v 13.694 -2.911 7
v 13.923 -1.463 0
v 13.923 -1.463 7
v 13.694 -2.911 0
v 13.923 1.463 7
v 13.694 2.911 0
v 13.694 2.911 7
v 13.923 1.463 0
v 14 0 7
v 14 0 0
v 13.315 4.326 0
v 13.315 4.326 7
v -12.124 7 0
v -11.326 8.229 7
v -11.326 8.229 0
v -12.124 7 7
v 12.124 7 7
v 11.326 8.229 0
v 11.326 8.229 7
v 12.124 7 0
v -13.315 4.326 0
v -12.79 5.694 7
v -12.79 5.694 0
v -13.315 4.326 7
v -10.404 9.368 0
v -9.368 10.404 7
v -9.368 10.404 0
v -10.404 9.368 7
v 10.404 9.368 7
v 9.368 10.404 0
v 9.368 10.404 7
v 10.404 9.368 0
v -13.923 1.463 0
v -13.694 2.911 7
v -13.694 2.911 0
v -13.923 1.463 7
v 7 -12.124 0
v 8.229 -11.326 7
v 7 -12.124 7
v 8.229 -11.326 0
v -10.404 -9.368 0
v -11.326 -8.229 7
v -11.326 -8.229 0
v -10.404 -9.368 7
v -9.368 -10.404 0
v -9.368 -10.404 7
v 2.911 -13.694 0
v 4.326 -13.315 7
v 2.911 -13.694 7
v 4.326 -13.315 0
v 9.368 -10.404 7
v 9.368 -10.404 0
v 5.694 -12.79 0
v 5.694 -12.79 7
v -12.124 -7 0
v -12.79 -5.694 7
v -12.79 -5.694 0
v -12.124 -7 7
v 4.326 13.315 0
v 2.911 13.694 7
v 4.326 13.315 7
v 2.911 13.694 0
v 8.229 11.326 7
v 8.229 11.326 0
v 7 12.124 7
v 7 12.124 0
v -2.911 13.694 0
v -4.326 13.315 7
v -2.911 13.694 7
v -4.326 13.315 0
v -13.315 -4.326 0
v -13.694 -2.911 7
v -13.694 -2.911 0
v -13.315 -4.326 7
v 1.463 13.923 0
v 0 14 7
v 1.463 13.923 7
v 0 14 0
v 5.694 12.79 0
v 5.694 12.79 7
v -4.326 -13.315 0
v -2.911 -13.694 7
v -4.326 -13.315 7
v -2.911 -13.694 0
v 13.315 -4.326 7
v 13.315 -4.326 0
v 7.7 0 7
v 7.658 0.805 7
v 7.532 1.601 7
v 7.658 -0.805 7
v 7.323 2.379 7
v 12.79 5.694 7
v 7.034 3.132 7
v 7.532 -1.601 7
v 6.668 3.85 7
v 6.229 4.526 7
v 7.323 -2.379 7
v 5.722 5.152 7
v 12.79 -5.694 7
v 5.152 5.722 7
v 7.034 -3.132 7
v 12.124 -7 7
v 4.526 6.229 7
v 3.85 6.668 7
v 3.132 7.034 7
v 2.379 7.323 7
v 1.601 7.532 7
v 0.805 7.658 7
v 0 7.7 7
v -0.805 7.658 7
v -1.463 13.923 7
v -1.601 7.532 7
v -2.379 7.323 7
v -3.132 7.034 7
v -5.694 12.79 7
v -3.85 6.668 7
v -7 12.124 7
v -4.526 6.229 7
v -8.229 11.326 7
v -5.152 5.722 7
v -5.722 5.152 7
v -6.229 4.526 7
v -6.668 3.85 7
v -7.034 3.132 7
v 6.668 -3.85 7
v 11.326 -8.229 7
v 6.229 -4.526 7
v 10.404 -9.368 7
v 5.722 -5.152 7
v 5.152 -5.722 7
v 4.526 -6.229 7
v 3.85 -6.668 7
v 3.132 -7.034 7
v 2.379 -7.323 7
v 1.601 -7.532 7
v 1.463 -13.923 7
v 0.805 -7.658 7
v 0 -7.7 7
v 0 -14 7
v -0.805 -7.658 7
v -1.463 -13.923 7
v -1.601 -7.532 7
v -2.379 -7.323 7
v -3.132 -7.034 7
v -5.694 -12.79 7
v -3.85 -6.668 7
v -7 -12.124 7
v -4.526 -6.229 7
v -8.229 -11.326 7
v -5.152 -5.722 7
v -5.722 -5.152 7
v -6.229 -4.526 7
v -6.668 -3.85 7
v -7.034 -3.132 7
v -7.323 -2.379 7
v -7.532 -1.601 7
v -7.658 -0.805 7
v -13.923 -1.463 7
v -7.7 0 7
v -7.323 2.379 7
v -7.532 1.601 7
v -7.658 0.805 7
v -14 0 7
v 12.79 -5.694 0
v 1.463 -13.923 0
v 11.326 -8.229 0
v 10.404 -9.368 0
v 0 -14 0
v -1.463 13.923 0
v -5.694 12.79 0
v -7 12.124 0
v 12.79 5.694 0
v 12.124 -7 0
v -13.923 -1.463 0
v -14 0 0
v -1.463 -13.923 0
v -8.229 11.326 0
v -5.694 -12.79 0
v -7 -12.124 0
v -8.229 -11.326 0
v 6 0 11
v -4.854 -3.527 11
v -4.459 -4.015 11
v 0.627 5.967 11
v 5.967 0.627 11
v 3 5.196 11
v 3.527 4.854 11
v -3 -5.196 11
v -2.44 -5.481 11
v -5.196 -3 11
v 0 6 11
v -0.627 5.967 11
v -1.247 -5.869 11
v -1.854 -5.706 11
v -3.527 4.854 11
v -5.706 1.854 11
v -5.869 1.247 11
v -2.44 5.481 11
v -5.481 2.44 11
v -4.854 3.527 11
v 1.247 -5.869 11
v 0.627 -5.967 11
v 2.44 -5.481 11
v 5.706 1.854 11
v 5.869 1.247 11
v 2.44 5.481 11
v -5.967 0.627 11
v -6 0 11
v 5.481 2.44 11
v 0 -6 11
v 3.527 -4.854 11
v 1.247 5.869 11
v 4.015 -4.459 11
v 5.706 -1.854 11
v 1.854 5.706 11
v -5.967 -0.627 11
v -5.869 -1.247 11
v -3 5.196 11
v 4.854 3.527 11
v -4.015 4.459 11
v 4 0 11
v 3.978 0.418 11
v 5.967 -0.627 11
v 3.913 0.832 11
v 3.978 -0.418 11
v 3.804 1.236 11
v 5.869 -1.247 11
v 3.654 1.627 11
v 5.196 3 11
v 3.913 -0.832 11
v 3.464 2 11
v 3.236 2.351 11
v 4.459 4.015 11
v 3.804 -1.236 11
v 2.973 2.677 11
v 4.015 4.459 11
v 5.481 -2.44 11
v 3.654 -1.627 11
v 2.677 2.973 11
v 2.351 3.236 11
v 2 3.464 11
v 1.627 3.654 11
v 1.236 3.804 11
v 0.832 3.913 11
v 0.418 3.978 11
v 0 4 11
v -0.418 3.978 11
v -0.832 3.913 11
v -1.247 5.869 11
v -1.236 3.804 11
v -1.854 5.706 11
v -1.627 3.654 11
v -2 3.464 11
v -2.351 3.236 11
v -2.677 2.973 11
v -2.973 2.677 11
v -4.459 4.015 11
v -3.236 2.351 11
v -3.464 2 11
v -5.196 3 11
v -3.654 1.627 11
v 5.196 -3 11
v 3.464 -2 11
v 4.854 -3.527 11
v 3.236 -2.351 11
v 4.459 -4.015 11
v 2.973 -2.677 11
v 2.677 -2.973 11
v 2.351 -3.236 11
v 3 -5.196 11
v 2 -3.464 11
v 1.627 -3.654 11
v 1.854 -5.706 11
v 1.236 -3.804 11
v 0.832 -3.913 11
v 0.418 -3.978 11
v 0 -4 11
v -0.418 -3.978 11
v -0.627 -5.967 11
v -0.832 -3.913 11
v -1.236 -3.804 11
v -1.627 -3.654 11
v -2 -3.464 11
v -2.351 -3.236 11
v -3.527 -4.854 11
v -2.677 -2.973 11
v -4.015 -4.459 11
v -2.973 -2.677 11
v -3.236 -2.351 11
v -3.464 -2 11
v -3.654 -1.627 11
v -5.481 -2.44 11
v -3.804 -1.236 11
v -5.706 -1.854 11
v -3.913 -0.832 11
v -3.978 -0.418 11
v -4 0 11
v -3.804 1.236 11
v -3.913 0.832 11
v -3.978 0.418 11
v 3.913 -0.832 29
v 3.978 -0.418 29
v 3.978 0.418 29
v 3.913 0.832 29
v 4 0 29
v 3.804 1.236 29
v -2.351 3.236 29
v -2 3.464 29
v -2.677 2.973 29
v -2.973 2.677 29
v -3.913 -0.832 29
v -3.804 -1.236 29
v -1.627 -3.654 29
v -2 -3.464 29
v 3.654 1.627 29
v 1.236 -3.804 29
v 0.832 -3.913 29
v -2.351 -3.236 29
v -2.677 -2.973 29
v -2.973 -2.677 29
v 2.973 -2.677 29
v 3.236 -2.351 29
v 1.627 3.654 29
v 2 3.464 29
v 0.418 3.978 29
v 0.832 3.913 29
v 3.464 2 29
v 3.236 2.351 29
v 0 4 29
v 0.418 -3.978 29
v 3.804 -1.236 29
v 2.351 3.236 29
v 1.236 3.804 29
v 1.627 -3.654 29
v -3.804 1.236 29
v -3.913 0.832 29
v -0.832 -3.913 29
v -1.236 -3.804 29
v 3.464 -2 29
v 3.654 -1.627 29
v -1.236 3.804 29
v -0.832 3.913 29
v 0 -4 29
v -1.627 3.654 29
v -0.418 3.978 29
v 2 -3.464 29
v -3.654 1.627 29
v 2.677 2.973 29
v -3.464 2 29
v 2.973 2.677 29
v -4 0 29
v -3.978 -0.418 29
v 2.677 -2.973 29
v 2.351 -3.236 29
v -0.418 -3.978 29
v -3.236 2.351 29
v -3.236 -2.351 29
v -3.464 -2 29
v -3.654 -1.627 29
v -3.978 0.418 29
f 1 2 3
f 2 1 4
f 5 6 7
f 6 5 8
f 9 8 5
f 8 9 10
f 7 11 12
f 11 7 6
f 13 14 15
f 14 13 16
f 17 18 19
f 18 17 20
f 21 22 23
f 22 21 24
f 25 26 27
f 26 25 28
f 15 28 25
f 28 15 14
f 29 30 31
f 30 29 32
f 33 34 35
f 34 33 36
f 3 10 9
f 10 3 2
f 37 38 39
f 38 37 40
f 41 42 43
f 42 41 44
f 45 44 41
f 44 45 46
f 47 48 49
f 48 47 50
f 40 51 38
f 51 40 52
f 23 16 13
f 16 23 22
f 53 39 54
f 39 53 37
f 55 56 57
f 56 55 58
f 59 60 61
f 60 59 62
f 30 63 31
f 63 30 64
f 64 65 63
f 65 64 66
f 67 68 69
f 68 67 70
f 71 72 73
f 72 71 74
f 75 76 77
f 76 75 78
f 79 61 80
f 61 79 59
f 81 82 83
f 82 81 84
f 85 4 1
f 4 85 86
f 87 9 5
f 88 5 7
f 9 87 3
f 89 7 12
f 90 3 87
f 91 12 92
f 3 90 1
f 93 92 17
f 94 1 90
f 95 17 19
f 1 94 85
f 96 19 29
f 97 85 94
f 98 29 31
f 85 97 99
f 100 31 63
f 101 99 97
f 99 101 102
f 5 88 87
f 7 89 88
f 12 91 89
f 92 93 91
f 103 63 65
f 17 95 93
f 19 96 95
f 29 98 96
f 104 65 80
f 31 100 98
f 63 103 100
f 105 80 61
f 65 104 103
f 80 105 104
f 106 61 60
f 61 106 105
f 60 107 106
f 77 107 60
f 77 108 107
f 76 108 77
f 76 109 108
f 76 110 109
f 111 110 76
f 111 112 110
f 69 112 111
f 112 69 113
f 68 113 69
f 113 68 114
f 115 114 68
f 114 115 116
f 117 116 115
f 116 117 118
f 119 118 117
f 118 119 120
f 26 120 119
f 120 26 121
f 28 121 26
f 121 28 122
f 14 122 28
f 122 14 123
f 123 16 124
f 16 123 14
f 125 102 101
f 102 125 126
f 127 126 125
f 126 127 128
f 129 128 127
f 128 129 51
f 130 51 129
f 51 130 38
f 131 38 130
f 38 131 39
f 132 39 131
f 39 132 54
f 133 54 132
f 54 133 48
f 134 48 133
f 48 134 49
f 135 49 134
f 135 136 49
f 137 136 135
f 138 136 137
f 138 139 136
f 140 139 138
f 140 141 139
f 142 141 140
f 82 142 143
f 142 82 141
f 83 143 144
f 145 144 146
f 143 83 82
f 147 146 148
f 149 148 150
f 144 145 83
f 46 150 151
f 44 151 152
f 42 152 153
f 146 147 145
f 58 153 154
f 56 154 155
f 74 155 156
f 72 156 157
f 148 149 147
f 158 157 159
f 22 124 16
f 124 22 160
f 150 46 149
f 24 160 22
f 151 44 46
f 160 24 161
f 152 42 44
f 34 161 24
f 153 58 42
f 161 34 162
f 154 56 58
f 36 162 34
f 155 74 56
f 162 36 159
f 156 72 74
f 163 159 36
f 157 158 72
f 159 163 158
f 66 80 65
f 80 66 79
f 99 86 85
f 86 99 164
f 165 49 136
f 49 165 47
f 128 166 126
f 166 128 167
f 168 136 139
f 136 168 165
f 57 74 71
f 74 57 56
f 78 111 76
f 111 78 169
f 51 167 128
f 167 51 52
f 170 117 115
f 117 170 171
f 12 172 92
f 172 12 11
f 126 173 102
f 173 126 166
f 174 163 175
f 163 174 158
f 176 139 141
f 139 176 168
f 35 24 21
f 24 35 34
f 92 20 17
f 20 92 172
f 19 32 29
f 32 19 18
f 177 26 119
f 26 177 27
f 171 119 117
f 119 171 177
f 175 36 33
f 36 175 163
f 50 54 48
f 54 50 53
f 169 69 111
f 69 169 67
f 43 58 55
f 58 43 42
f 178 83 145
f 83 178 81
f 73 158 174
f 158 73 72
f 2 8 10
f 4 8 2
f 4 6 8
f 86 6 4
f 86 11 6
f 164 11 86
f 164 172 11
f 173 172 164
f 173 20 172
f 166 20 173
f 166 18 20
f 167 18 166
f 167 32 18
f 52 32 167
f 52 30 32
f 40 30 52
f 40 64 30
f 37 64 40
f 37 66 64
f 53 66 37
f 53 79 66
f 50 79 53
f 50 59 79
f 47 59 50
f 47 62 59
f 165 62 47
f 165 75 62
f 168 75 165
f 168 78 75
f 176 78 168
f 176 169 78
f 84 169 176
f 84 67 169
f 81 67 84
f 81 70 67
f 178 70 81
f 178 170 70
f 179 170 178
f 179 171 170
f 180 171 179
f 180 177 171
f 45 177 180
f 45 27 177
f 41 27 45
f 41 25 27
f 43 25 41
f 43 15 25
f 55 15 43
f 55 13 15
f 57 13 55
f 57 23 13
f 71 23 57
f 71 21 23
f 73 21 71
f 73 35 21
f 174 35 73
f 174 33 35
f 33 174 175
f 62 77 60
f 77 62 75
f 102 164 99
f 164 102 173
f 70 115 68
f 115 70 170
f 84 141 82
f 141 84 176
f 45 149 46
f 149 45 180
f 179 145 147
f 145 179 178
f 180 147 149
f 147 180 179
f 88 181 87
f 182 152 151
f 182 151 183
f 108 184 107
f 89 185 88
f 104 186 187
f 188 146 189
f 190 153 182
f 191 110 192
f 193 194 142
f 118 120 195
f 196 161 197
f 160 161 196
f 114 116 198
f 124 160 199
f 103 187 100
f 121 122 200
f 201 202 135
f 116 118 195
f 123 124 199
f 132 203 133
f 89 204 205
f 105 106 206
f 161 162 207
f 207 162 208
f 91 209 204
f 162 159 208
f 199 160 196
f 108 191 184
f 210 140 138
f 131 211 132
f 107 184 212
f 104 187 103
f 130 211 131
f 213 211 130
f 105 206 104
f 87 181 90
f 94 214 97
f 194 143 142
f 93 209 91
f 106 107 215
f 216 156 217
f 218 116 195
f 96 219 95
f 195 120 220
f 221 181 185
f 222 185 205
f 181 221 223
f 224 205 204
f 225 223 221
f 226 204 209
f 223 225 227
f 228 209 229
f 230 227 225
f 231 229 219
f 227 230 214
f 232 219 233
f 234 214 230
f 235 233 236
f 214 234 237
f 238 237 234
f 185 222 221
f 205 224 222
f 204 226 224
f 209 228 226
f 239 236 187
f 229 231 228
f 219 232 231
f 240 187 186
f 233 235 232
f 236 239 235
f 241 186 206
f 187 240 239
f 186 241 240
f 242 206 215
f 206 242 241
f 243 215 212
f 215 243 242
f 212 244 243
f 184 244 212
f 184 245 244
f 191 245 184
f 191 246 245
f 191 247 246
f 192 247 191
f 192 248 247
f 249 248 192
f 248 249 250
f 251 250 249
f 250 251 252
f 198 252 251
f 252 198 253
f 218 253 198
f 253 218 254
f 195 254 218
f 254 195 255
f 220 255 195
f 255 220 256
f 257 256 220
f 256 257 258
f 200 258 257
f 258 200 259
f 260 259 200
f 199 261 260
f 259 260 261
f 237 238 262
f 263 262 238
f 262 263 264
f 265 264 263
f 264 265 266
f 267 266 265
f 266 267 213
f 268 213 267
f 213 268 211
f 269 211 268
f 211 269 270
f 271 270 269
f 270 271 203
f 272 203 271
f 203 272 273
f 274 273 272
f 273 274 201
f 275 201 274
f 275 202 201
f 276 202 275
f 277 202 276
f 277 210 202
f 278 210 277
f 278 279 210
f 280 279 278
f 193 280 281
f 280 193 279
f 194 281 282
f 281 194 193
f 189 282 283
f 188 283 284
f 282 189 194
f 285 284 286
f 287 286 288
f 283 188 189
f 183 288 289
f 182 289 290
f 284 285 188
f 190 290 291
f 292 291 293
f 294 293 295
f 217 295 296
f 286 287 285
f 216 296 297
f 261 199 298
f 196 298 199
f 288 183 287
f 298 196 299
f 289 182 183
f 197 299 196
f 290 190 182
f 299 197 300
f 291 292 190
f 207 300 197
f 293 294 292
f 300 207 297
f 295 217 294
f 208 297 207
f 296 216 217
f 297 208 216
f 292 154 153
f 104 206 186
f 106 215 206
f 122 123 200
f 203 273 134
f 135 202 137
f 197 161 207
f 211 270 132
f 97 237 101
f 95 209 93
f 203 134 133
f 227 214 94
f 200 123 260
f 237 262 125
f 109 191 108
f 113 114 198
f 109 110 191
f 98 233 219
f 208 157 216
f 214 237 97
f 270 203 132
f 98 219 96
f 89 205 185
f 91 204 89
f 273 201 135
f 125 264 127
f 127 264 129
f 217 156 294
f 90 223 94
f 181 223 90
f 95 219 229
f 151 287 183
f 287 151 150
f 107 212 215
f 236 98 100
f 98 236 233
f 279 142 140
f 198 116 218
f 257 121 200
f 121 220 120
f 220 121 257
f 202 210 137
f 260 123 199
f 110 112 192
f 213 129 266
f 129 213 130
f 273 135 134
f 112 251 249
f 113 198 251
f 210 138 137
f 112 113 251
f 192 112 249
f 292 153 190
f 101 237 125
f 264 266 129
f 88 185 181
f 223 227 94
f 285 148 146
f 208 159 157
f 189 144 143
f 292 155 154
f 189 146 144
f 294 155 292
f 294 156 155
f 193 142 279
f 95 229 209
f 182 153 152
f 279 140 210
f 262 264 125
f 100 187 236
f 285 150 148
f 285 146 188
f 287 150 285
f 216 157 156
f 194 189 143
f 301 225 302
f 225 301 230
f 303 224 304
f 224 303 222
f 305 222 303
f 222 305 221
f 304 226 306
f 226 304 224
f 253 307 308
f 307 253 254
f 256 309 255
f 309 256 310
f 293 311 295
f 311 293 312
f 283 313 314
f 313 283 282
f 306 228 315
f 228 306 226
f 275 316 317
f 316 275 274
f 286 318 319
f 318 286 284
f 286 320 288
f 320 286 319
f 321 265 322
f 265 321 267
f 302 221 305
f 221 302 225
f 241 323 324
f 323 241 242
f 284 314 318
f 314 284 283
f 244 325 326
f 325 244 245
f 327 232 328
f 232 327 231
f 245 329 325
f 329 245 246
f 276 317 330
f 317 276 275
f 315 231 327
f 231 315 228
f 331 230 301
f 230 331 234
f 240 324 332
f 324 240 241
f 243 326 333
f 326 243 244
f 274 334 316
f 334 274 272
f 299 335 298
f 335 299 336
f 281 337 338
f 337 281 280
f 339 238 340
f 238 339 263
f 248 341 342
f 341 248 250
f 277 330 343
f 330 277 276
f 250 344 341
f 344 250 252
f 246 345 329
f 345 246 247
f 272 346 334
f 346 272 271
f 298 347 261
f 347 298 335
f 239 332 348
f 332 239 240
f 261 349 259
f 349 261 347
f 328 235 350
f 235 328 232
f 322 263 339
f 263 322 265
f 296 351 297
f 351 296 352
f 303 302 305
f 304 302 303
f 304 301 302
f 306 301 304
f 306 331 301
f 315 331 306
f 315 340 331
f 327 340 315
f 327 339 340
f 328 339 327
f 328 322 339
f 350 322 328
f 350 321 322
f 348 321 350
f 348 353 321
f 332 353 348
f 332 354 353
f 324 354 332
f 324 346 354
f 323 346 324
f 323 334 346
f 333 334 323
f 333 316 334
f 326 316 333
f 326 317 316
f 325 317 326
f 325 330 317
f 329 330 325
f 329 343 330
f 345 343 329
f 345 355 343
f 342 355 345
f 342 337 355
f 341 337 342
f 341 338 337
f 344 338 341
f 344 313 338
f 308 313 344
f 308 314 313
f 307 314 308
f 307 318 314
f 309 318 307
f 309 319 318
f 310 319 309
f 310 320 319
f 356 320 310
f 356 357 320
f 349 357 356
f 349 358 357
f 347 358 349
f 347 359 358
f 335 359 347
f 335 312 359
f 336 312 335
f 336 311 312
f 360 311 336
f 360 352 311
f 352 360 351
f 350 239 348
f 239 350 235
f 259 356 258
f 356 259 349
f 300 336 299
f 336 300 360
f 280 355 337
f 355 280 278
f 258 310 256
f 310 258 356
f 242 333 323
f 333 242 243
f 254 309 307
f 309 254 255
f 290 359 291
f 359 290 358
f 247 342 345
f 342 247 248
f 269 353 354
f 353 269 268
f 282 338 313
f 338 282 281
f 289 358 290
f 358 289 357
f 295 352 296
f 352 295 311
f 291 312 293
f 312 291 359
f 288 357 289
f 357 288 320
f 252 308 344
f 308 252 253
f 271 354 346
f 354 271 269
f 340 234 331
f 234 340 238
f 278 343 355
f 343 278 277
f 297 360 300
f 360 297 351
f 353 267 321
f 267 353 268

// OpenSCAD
// Adjustable leveling foot, smooth threaded-shaft representation.
$fn = 60;
eps = 0.02;
shaft_d = 8;
pad_d = 28;
shaft_l = 18;
pad_h = 7;
union() {
    cylinder(d = pad_d, h = pad_h);
    translate([0, 0, pad_h]) cylinder(d1 = pad_d * 0.55, d2 = shaft_d + 4, h = 4);
    translate([0, 0, pad_h + 4]) cylinder(d = shaft_d, h = shaft_l);
}
